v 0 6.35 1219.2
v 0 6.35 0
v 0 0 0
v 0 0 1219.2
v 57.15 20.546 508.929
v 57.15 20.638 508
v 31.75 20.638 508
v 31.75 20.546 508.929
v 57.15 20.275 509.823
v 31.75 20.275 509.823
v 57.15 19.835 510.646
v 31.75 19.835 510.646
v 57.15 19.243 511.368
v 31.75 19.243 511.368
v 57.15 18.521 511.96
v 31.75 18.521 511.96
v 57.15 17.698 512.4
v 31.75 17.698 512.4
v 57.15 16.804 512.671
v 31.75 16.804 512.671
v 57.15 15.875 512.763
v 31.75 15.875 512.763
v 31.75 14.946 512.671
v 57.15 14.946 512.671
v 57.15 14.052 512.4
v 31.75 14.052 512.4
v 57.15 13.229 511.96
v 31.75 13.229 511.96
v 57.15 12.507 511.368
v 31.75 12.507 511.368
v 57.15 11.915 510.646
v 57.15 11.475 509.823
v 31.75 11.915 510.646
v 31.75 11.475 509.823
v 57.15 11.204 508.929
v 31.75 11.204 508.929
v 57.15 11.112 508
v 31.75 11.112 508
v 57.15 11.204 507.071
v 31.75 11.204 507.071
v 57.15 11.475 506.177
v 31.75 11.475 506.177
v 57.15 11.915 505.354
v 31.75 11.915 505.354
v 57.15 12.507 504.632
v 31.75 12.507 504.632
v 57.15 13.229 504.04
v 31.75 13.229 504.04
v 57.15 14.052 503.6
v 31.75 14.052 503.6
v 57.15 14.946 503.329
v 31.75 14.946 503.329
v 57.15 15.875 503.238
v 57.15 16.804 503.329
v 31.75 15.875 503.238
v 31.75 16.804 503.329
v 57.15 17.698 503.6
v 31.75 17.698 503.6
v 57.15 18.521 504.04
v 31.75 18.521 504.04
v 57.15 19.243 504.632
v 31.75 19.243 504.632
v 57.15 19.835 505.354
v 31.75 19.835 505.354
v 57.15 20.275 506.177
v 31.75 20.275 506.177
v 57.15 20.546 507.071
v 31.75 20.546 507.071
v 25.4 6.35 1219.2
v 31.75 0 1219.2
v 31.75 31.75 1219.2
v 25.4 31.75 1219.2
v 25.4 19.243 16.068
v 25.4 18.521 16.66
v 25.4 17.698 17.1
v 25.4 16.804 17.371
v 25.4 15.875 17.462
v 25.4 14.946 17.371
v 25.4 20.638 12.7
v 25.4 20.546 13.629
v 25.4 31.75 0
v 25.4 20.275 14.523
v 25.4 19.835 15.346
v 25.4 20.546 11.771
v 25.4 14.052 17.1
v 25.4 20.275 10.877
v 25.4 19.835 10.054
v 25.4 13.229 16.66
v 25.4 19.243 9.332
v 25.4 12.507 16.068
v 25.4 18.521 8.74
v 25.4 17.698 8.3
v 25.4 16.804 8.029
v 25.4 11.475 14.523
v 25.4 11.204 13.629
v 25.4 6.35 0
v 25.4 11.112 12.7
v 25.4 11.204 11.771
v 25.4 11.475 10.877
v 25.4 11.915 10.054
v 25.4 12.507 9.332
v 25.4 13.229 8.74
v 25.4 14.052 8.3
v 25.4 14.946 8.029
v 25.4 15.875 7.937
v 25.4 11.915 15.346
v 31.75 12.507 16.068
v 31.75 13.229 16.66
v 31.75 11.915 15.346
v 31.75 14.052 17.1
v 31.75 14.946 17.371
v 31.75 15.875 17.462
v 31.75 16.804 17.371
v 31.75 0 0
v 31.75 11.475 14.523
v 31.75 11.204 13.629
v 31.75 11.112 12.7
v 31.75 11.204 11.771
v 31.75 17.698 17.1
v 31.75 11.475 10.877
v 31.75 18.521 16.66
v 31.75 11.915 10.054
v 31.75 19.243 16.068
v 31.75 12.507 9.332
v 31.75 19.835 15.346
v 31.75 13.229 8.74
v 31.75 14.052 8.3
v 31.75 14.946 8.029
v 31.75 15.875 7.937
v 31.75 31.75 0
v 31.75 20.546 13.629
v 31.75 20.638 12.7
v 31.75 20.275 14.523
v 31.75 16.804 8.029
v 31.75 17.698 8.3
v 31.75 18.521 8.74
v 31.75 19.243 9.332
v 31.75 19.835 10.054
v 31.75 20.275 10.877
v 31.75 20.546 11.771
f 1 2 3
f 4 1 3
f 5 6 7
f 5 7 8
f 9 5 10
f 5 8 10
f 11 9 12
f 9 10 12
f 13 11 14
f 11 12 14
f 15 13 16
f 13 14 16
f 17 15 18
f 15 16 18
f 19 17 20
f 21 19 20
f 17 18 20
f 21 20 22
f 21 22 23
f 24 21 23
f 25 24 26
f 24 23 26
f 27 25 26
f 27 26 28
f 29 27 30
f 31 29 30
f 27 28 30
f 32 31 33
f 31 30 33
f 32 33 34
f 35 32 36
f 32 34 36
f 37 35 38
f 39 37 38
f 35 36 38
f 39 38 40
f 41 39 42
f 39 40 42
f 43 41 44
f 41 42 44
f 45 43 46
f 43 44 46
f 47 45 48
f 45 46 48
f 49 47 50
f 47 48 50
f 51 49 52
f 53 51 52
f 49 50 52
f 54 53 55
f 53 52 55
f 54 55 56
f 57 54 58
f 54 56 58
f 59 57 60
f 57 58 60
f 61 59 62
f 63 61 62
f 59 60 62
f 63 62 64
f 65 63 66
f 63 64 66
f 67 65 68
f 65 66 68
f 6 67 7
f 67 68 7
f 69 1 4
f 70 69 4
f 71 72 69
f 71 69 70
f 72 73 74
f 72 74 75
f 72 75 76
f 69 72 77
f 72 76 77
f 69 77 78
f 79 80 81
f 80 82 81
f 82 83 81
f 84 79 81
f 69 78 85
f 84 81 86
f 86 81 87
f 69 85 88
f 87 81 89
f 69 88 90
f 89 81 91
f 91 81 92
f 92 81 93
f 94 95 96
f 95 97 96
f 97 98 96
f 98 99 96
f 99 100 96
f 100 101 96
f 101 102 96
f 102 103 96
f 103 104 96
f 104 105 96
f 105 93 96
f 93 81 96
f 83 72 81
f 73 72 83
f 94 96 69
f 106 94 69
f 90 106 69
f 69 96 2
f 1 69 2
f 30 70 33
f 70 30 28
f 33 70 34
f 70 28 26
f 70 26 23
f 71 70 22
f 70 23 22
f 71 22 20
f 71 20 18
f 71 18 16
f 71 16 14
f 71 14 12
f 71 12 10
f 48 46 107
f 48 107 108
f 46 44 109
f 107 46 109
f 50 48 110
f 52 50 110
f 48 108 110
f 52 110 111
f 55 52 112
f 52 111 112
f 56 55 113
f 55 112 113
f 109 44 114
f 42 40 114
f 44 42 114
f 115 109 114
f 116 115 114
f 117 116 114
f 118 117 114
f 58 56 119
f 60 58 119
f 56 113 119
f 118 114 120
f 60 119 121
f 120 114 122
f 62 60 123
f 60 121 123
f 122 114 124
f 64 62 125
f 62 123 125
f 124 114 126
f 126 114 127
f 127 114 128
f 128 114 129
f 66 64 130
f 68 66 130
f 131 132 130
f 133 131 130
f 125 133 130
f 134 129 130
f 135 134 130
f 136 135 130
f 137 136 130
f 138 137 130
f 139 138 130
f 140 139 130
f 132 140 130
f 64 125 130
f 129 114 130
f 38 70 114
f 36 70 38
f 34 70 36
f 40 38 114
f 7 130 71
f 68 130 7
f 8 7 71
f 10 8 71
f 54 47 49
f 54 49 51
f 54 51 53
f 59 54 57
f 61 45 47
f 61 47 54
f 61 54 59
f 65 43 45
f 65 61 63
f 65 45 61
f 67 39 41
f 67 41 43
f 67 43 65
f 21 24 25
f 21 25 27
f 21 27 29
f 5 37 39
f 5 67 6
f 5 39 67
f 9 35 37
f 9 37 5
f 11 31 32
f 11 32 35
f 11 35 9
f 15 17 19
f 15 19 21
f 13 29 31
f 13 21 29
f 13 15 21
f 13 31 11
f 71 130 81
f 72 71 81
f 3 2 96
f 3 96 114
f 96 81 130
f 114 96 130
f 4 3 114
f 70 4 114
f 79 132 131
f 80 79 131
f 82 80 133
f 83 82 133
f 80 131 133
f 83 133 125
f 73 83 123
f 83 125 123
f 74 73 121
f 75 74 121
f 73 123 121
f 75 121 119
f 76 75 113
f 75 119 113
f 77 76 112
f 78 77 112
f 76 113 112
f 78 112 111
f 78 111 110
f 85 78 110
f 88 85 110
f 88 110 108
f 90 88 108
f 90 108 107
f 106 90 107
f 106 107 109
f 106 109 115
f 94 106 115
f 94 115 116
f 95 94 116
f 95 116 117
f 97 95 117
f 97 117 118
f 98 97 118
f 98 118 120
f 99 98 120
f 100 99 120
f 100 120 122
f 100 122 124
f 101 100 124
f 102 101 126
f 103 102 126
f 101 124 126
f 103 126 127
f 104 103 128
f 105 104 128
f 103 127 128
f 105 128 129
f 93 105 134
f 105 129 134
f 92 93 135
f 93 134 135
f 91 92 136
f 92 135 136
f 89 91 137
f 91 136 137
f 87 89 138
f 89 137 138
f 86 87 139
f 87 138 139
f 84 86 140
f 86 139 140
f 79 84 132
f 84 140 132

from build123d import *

# Parameters (mm, degrees)
F1_DEPTH = 1219.2
F2_R     = 4.7625
F3_DEPTH = 31.751
F4_R     = 4.7625
F5_DEPTH = 25.4


with BuildPart() as f1:
    # F0 (on Top) → F1 (new body)
    with BuildSketch(Plane.XY):
        Polygon((0, 6.35), (0, 0), (31.75, 0), (31.75, 31.75), (25.4, 31.75), (25.4, 6.35), align=None)
    extrude(amount=F1_DEPTH)

    # F2 (on face) → F3 (cut, through all)
    with BuildSketch(Plane.YZ.offset(31.75)):
        with Locations((15.875, 12.7)):
            Circle(F2_R)
    extrude(amount=-F3_DEPTH, mode=Mode.SUBTRACT)

    # F4 (on face) → F5 (join)
    with BuildSketch(Plane.YZ.offset(31.75)):
        with Locations((15.875, 508)):
            Circle(F4_R)
    extrude(amount=F5_DEPTH)


solid = f1.part
